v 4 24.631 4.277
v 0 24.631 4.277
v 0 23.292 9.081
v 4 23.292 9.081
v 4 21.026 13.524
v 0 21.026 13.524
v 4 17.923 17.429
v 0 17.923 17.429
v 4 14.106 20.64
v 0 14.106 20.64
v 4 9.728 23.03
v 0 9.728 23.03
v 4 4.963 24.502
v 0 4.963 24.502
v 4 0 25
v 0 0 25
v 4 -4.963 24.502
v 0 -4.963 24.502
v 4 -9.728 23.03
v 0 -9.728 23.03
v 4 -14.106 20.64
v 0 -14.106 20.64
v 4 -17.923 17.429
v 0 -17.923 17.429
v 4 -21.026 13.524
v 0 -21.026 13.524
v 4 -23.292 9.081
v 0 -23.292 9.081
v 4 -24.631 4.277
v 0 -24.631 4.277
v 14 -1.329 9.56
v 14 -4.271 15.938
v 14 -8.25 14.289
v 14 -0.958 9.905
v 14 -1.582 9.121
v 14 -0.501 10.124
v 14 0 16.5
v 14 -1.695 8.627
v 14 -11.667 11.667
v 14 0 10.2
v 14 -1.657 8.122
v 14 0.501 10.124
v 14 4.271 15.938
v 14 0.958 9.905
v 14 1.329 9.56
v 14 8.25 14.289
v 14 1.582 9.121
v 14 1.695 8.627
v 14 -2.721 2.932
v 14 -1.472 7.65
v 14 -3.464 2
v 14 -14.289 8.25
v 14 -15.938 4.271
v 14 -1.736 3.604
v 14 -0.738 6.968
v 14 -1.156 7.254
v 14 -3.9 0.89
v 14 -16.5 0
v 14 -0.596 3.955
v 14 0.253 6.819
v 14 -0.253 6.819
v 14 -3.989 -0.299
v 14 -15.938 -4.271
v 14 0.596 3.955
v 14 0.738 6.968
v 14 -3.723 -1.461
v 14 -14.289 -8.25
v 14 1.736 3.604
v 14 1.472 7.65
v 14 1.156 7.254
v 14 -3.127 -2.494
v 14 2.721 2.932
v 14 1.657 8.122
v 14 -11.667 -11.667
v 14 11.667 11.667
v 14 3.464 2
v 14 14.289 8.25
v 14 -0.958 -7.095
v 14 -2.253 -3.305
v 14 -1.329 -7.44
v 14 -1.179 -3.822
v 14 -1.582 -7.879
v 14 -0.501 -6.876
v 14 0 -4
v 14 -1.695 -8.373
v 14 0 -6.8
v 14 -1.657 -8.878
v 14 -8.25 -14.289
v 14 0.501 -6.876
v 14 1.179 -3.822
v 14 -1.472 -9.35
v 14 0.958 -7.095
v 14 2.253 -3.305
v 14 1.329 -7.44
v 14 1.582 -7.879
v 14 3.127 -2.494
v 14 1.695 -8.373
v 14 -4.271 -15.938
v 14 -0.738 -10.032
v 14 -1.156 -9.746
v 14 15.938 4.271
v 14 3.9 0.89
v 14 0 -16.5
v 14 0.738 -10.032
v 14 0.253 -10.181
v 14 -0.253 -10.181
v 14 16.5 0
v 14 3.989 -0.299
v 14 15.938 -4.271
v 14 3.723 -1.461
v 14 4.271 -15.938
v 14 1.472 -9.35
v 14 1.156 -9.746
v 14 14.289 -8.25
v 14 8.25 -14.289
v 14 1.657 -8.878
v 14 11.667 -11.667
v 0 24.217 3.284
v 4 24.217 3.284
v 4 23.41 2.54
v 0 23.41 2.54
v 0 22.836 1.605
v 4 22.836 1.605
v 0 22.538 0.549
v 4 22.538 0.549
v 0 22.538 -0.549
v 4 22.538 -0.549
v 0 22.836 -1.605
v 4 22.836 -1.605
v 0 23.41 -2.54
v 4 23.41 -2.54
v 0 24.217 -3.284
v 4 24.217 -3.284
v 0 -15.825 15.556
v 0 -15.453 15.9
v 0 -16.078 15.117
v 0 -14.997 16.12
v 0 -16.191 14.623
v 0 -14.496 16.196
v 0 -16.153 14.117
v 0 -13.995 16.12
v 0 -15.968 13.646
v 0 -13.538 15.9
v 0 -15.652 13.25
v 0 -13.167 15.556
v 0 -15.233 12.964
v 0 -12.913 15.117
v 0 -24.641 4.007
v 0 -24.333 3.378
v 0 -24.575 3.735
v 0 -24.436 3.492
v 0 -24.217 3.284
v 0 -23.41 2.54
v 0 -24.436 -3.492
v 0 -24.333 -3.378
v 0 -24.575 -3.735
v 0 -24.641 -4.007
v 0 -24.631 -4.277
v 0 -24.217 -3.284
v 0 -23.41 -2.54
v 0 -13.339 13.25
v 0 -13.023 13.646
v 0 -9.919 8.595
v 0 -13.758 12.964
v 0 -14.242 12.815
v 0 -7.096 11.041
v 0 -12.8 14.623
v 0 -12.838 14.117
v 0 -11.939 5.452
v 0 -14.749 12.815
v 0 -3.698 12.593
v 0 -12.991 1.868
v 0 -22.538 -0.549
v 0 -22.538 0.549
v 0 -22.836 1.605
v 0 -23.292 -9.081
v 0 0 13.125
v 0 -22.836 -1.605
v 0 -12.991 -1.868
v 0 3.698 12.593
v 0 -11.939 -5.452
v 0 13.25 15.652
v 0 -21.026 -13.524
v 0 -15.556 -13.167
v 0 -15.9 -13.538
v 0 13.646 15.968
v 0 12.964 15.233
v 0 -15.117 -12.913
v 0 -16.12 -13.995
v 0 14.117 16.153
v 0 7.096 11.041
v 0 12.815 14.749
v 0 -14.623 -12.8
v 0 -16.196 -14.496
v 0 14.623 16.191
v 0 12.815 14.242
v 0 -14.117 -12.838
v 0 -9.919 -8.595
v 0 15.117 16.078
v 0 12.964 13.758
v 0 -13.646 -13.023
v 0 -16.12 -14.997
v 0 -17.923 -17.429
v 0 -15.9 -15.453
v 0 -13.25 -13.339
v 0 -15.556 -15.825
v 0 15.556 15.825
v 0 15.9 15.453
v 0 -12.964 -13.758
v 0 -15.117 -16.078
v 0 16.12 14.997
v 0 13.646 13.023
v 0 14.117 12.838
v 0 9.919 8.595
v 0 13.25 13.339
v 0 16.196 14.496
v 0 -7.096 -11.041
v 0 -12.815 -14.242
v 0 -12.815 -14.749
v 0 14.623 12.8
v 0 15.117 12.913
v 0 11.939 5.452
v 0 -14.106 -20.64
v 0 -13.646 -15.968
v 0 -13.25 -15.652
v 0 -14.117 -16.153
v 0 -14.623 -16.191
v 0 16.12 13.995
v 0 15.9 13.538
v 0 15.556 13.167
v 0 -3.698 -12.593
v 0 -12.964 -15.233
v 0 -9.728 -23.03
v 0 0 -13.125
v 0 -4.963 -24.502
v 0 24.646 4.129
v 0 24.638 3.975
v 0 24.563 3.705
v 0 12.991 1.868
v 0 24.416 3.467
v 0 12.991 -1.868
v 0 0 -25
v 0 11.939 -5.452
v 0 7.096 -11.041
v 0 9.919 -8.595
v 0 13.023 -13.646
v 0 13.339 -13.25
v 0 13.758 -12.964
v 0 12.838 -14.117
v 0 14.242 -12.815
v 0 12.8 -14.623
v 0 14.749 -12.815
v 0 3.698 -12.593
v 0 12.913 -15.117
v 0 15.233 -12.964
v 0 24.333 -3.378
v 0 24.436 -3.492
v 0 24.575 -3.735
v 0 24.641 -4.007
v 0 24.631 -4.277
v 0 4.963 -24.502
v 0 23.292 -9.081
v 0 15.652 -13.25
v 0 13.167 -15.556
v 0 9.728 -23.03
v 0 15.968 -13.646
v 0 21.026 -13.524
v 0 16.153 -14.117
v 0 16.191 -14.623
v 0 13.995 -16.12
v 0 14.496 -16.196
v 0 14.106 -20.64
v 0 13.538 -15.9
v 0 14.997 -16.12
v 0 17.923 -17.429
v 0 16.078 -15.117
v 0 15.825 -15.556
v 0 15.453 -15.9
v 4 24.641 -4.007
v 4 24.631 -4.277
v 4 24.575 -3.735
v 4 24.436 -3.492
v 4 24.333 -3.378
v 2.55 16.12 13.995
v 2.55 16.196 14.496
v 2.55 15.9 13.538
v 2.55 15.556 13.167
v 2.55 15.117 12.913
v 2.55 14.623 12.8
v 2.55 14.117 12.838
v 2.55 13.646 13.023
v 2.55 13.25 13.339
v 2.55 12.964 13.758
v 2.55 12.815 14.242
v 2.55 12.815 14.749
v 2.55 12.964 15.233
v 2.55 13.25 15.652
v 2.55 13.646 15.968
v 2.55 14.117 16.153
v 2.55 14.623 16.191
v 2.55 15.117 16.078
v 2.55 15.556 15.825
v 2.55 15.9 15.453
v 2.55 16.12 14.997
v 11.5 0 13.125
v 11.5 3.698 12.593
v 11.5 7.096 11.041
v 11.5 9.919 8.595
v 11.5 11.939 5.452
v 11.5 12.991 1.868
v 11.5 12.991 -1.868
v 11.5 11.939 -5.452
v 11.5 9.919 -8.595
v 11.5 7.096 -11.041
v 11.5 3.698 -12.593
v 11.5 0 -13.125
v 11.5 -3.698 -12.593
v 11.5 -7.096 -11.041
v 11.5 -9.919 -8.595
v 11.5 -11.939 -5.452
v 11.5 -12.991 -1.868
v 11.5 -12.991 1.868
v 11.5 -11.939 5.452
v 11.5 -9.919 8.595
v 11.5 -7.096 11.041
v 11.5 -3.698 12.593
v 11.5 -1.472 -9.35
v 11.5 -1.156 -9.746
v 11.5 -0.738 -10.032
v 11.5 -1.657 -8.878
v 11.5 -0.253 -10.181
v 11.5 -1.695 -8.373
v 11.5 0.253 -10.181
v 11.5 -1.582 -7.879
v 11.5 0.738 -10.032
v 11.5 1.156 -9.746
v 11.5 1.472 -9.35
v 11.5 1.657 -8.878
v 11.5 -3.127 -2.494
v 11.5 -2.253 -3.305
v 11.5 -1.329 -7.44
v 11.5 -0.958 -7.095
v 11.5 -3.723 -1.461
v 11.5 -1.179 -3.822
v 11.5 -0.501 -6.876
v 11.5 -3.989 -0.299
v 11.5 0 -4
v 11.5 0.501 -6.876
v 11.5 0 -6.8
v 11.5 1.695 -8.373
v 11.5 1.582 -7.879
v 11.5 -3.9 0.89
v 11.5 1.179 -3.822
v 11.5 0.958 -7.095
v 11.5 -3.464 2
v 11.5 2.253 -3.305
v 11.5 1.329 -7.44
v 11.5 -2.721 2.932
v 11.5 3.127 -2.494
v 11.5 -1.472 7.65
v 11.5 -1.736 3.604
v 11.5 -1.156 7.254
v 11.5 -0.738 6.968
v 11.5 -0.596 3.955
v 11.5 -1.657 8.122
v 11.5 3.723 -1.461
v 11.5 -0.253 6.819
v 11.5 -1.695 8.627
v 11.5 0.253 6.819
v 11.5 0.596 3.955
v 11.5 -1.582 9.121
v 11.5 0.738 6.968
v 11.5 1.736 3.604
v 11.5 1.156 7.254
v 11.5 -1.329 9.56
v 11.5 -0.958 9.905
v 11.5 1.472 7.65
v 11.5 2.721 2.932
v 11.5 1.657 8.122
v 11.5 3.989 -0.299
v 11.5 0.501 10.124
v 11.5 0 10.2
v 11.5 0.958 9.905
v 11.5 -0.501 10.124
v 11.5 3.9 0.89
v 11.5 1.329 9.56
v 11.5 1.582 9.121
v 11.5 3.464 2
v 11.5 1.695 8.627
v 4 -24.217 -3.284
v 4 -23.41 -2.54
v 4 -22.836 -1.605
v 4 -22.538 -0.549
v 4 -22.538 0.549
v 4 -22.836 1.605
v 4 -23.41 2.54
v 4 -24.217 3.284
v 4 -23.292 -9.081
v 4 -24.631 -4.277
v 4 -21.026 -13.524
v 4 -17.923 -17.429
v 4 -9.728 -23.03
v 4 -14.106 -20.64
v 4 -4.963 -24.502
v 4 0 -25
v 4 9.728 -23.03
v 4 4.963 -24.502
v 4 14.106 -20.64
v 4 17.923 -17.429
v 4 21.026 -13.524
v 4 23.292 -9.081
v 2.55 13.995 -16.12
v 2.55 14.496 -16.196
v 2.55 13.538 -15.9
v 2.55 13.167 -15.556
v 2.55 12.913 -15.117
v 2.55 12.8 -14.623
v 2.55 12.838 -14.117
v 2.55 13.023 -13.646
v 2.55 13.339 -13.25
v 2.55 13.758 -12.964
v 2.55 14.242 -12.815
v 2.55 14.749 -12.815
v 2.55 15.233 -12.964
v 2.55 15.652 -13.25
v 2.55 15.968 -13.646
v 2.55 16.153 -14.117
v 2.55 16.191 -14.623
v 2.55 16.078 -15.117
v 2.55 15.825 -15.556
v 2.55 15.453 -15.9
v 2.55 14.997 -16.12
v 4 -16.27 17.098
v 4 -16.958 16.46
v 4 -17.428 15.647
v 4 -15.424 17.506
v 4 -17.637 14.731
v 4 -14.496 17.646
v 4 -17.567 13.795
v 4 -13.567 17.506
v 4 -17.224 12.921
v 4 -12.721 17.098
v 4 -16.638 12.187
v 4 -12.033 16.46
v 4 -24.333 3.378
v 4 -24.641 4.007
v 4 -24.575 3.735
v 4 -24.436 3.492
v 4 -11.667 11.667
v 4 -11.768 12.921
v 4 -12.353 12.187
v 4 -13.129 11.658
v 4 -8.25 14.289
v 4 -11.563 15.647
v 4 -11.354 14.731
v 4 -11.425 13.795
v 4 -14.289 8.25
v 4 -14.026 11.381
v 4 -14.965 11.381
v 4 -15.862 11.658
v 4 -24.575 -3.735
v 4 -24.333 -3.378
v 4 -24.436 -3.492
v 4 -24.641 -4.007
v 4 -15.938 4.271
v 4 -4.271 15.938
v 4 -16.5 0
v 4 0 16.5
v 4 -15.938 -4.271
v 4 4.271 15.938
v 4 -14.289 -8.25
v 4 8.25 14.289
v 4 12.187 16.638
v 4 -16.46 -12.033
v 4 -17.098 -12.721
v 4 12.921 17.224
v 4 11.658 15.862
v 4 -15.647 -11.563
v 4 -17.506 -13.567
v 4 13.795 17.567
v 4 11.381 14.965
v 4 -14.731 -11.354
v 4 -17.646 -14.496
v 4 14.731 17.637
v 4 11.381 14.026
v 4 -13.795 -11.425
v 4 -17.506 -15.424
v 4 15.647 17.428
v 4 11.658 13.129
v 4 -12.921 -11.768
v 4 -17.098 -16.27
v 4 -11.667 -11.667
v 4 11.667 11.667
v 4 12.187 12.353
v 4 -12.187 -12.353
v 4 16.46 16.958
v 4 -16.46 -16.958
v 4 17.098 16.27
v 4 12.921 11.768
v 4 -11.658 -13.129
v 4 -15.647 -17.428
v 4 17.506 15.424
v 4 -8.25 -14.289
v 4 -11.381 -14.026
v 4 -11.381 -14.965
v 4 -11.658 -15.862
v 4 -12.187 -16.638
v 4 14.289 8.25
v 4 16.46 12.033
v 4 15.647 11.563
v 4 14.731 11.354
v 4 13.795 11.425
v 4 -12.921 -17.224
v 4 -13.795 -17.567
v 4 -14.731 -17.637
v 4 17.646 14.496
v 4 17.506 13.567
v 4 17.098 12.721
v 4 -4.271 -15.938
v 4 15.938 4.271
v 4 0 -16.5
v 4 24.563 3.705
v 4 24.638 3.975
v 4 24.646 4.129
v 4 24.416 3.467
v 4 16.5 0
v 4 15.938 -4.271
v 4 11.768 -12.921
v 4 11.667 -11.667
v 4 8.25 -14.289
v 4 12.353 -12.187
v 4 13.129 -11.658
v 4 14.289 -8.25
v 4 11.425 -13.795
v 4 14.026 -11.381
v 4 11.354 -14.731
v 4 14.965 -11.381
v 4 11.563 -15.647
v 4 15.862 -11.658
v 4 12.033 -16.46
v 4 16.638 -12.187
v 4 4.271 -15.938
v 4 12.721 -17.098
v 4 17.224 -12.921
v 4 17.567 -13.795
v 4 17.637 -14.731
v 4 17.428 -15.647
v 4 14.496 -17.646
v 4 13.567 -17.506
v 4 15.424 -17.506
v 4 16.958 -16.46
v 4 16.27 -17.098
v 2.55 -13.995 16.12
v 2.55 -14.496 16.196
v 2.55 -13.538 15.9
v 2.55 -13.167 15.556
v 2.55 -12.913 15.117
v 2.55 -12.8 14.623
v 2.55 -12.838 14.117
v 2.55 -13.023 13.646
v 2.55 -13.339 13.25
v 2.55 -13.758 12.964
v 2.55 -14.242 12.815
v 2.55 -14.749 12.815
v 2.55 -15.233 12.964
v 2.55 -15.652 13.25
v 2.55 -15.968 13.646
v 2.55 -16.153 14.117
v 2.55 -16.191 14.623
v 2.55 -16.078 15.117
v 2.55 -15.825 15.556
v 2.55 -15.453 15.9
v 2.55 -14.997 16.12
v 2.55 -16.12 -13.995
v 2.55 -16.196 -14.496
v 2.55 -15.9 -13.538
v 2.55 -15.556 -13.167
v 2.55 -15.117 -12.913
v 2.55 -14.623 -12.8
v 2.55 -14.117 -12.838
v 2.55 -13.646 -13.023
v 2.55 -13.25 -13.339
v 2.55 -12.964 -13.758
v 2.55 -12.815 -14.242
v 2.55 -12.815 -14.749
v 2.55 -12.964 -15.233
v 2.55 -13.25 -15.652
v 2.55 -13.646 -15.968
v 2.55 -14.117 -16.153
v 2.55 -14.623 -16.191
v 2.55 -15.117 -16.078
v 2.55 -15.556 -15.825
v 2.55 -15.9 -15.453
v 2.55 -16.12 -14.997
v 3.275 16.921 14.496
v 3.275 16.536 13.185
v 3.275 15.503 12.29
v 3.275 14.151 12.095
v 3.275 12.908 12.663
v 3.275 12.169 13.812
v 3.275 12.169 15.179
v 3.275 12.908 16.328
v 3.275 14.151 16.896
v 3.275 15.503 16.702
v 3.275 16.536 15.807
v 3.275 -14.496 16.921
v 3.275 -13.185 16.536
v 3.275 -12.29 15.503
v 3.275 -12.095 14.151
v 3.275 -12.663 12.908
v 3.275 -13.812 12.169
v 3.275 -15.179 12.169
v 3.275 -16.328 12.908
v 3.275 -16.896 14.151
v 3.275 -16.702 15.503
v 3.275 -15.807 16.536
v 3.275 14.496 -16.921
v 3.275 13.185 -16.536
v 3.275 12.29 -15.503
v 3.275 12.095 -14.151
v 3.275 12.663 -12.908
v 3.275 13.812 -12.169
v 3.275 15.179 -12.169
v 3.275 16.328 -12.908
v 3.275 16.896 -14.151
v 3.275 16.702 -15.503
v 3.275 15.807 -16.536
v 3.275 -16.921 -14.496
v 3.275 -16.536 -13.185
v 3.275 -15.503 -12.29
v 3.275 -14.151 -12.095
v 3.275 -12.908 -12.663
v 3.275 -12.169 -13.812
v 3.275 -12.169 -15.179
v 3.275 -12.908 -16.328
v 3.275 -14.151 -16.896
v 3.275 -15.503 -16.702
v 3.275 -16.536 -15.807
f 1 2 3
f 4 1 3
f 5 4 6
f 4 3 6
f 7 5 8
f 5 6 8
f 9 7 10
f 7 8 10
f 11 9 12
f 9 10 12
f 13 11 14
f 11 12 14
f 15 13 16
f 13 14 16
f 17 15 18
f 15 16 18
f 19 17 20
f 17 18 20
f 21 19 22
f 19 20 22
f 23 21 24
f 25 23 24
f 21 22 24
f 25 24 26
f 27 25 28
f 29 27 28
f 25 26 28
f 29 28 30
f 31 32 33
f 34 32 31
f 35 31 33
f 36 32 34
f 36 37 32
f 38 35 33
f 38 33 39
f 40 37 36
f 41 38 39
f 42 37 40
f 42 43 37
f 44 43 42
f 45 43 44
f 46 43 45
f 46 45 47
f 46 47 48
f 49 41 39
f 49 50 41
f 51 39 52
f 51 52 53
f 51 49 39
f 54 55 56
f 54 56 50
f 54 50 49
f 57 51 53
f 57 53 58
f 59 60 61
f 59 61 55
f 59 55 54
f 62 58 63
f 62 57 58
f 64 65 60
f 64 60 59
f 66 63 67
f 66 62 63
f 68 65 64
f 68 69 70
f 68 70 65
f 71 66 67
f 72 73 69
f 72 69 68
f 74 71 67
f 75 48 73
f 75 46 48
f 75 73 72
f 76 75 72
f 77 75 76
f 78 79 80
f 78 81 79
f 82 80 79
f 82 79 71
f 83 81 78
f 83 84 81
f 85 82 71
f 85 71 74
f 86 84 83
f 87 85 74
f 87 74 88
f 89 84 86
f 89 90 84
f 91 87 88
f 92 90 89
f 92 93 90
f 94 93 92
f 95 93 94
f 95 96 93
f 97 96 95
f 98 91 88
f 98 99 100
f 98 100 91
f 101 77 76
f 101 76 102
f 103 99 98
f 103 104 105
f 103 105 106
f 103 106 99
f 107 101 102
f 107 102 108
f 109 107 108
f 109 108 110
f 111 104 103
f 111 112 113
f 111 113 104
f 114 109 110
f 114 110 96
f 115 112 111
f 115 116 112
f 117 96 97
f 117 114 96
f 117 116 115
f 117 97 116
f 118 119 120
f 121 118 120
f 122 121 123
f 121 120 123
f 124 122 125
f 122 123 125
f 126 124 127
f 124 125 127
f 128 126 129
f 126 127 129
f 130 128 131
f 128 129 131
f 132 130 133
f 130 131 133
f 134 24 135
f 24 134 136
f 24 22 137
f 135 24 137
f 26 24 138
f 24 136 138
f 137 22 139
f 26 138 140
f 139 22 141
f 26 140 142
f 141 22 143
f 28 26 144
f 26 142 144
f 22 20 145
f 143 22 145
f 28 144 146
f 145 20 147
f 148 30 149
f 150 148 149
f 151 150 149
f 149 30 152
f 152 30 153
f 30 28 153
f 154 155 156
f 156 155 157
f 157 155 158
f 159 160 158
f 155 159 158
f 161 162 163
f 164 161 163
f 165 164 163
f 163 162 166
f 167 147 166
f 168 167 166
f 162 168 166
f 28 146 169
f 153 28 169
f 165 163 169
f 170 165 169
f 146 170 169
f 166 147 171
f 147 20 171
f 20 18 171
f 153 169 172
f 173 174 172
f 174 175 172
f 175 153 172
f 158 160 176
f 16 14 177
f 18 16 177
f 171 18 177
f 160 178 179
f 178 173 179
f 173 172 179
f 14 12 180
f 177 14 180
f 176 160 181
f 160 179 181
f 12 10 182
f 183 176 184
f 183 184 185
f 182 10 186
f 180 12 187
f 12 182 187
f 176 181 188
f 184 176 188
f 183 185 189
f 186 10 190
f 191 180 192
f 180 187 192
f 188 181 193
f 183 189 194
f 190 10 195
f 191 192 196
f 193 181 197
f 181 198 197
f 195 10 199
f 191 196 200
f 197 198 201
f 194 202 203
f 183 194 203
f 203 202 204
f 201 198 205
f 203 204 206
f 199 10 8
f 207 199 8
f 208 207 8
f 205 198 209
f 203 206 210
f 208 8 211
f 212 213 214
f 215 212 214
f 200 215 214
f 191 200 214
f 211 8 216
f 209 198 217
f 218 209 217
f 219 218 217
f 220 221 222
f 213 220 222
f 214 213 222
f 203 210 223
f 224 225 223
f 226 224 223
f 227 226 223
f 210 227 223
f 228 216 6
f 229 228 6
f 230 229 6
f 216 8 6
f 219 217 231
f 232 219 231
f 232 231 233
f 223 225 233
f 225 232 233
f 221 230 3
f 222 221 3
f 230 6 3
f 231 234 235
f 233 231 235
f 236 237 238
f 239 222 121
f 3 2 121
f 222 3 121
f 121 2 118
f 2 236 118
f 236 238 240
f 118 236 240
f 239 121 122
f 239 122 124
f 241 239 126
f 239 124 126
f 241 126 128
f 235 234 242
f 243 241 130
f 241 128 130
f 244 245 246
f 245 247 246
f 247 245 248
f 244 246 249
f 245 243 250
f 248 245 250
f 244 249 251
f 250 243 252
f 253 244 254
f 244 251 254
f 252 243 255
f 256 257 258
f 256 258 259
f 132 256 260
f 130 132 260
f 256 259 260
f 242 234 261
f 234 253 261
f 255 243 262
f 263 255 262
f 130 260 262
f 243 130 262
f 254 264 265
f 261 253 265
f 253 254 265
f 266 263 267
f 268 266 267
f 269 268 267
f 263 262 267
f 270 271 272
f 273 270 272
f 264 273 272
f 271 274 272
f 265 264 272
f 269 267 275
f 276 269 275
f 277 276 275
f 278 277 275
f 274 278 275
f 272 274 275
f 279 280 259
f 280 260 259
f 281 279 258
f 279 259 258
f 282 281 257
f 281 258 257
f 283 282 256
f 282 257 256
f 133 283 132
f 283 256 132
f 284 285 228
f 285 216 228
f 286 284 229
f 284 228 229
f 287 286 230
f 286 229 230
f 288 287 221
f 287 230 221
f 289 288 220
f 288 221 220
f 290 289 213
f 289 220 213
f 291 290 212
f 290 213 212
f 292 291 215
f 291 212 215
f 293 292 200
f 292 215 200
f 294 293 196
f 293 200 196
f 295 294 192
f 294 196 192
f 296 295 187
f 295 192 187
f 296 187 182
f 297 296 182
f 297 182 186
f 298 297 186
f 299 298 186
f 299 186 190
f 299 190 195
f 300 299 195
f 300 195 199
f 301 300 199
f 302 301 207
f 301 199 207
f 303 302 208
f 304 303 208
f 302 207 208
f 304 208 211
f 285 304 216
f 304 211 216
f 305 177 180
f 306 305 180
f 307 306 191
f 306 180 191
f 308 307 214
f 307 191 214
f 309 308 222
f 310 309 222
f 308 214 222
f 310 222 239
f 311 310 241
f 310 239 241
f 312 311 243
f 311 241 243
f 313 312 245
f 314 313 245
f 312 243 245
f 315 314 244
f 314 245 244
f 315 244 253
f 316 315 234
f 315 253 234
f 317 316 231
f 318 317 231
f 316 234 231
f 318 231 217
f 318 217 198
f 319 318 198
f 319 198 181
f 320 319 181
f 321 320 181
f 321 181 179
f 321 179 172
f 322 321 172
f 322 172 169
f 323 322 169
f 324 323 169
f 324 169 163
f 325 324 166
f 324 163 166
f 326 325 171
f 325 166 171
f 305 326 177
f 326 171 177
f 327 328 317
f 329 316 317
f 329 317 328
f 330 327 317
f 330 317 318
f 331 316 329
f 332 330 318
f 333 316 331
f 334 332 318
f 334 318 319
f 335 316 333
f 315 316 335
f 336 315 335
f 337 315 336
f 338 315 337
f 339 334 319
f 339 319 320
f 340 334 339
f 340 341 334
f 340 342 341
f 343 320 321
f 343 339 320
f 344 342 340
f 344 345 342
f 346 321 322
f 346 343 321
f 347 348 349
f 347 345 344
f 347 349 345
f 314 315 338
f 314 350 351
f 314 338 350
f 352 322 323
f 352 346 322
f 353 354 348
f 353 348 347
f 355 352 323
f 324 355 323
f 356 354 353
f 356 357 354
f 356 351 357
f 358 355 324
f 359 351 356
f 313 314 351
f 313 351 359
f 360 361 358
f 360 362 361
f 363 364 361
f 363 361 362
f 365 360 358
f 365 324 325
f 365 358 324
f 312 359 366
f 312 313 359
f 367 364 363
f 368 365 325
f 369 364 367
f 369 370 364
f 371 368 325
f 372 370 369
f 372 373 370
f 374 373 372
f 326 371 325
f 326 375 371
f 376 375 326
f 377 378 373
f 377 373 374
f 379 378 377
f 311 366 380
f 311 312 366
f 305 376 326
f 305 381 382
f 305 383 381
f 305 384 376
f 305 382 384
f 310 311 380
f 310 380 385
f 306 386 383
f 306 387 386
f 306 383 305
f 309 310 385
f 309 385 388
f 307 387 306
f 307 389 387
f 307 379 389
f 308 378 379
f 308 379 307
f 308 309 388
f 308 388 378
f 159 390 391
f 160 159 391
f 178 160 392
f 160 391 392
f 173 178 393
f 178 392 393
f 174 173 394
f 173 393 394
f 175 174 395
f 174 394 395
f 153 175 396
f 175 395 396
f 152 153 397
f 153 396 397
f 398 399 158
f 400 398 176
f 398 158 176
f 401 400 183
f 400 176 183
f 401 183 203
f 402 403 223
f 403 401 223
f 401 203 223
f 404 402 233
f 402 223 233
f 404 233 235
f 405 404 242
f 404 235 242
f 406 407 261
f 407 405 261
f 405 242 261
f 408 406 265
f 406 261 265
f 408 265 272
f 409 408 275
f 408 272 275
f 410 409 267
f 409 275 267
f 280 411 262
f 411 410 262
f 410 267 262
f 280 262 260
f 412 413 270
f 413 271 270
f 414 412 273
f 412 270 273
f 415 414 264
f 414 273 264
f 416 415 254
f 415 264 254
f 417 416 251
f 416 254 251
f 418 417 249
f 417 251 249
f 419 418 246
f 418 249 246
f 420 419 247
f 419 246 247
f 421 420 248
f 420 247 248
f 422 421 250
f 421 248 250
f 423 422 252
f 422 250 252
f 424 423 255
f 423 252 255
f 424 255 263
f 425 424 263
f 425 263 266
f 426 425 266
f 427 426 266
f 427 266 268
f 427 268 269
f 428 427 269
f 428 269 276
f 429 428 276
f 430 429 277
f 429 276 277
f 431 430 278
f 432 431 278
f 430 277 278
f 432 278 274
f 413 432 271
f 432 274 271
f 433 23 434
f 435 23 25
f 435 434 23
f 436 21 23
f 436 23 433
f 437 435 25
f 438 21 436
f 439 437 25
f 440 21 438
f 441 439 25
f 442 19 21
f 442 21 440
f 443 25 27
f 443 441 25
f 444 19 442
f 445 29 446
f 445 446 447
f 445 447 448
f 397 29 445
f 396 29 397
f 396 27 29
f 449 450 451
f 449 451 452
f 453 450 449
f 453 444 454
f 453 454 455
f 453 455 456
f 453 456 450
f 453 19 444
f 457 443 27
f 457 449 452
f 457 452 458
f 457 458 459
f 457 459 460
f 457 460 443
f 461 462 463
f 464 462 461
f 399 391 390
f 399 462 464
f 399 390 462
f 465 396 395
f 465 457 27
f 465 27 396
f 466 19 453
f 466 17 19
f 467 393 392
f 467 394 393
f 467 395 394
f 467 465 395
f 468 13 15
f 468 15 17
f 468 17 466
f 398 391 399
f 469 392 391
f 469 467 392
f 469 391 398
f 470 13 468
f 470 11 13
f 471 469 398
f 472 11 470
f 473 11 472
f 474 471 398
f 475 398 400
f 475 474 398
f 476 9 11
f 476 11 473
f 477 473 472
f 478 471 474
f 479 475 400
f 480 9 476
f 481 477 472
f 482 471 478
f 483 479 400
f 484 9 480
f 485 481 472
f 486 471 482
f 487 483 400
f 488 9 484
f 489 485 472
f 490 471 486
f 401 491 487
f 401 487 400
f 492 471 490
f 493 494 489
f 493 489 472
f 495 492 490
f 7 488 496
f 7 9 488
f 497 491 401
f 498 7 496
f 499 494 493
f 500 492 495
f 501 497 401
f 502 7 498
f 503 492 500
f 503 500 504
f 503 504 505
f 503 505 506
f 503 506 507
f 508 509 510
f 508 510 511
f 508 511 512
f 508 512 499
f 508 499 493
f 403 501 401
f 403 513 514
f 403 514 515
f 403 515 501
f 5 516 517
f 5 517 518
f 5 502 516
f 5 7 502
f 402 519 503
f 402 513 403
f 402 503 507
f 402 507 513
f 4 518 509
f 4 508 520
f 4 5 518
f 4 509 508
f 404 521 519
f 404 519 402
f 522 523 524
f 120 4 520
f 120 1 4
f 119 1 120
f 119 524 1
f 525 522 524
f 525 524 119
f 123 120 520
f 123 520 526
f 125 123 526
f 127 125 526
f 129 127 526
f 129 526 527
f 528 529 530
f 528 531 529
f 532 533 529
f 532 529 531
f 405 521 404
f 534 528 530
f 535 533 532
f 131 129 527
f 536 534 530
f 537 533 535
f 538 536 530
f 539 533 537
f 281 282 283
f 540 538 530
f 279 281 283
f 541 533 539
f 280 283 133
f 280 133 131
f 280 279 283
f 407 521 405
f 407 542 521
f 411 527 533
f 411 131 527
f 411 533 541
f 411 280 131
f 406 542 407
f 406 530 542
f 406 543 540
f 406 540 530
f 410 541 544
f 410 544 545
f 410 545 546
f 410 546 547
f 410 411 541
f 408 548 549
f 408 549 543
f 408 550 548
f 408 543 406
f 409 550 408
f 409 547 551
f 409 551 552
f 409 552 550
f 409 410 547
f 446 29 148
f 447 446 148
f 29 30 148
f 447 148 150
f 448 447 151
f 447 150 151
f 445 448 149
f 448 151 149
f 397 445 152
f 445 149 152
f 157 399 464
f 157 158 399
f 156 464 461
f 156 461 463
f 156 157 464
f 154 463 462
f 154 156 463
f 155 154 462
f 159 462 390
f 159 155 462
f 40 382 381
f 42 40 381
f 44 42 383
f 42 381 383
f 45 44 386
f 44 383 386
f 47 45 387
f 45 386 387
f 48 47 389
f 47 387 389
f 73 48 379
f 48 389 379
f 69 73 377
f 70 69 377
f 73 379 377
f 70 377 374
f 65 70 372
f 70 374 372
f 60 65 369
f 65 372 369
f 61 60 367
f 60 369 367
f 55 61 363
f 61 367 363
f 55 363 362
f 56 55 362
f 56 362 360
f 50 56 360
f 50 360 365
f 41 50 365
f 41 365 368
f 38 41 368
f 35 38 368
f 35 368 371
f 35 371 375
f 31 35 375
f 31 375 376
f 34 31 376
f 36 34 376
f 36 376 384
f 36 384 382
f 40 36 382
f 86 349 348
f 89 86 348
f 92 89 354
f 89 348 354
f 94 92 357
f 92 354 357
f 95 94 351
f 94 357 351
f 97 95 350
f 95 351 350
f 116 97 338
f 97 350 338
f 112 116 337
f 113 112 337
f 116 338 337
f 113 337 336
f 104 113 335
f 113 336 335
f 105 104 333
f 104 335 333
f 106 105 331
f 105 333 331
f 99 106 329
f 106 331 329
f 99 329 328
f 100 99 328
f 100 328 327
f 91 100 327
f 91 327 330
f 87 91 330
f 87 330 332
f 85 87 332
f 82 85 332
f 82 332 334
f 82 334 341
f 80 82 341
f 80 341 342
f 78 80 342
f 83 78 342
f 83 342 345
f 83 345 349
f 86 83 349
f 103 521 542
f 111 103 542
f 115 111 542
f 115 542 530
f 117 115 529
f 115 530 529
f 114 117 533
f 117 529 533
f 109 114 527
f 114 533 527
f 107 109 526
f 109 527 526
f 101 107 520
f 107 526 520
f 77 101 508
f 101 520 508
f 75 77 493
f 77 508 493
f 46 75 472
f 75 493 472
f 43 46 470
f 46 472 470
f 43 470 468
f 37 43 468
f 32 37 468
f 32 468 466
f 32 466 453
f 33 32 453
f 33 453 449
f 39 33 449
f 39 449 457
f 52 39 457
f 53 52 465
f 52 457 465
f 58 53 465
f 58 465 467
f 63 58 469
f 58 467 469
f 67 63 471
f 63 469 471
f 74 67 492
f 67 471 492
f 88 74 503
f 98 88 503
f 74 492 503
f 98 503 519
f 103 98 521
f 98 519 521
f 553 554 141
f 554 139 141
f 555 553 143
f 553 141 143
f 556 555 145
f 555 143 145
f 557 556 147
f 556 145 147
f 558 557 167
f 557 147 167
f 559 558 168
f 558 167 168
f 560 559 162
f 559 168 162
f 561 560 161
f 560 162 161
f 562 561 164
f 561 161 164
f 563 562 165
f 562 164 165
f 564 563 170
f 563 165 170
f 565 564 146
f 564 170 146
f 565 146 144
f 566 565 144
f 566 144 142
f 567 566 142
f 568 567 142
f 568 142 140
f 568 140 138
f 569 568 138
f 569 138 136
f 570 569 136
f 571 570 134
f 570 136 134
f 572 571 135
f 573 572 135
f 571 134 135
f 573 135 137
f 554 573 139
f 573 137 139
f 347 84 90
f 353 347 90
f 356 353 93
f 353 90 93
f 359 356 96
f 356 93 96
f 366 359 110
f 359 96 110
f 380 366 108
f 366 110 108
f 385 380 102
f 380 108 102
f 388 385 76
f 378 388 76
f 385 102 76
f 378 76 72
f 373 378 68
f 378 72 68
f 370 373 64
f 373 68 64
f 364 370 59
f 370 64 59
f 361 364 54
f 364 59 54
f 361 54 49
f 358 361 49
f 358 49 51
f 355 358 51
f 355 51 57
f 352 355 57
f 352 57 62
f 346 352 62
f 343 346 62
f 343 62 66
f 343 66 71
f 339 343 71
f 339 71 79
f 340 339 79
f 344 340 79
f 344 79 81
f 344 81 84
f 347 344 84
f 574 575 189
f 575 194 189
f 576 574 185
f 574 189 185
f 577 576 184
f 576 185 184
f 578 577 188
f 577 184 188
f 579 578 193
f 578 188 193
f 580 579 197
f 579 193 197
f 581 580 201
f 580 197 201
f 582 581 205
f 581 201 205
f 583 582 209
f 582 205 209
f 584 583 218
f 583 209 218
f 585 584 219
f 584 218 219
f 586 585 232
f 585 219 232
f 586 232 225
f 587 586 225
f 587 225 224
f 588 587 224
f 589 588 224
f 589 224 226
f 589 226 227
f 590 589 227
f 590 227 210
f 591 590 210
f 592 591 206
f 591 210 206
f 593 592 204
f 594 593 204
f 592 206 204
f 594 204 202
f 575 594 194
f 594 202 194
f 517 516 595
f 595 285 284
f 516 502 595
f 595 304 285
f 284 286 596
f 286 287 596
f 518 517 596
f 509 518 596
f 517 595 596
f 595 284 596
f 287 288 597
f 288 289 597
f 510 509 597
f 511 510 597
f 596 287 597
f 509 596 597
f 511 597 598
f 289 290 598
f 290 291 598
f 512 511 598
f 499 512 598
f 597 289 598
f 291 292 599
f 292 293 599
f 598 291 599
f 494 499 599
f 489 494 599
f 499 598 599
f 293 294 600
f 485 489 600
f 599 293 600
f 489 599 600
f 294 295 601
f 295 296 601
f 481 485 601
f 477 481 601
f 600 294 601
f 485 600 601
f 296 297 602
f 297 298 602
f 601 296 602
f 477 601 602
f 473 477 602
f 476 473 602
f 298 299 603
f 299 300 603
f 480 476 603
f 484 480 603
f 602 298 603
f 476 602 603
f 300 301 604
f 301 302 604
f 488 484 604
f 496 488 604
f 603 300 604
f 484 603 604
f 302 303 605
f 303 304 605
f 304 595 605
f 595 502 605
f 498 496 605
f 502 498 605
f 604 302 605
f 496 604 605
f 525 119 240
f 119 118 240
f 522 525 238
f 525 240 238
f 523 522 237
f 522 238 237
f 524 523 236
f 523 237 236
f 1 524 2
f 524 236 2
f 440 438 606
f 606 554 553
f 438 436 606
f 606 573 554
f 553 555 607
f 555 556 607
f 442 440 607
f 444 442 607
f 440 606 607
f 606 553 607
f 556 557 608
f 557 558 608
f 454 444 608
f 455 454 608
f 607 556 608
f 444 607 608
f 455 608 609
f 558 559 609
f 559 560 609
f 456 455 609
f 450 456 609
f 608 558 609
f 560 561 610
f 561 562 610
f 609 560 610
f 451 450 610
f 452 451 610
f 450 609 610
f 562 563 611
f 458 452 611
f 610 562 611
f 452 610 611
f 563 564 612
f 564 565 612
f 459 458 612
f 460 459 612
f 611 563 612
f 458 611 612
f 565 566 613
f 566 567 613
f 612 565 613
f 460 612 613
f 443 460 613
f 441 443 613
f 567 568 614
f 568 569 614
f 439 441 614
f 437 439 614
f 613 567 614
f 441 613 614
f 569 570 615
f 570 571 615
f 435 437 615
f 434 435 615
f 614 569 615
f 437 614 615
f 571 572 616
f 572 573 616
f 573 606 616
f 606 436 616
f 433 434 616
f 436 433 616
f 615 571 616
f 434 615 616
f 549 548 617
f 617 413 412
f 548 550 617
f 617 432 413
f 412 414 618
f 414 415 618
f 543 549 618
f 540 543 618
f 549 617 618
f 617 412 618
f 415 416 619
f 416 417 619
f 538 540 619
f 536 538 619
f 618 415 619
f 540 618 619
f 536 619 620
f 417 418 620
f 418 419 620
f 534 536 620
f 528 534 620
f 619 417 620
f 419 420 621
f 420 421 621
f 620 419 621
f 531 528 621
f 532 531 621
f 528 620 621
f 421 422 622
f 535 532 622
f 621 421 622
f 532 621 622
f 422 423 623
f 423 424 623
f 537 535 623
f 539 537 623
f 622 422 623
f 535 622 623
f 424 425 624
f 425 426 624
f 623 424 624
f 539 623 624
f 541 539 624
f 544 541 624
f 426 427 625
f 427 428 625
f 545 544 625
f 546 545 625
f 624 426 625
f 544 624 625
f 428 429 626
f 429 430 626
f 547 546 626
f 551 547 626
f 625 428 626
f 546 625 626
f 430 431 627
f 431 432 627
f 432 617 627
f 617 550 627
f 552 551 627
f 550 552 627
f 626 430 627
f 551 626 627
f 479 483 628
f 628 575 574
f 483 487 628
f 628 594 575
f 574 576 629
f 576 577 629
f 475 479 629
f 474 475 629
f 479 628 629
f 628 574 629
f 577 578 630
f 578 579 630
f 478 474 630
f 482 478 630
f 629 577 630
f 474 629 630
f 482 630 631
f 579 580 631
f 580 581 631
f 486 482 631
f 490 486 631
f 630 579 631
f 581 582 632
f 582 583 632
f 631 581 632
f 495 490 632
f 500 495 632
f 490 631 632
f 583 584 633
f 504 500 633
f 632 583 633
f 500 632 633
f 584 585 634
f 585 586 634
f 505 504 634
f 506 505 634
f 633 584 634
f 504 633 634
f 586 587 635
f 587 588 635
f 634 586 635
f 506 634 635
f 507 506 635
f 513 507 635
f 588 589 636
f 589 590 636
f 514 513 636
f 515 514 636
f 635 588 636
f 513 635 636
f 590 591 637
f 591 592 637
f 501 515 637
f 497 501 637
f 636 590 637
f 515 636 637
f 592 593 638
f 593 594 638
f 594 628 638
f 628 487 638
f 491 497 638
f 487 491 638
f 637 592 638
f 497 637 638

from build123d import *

# Parameters (mm, degrees)
SKETCH1_R                                       = 25
BOSS_EXTRUDE1_DEPTH                             = 4
SKETCH2_R                                       = 16.5
BOSS_EXTRUDE2_DEPTH                             = 10
SKETCH3_R                                       = 12.5
CUT_EXTRUDE1_DEPTH                              = 11.5
SKETCH4_R                                       = 4
CUT_EXTRUDE2_DEPTH                              = 4
M3_CLEARANCE_HOLE1_D                            = 3.4
M3_CLEARANCE_HOLE1_DEPTH                        = 10
CSK_FOR_M3_FLAT_HEAD_MACHINE_SCREW1_D           = 3.4
CSK_FOR_M3_FLAT_HEAD_MACHINE_SCREW1_CSINK_D     = 6.3
CSK_FOR_M3_FLAT_HEAD_MACHINE_SCREW1_CSINK_ANGLE = 90
CIRPATTERN1_COUNT                               = 4
SKETCH10_R                                      = 13.125
CUT_EXTRUDE3_DEPTH                              = 11.5
SKETCH12_R                                      = 4
CUT_EXTRUDE4_DEPTH                              = 10
FILLET1_R                                       = 1


with BuildPart() as part:
    # Sketch1 → Boss-Extrude1 (new body)
    with BuildSketch(Plane(origin=(0, 0, 0), x_dir=(0, 0, -1), z_dir=(1, 0, 0))):
        Circle(SKETCH1_R)
    extrude(amount=BOSS_EXTRUDE1_DEPTH)

    # Sketch2 → Boss-Extrude2 (add)
    with BuildSketch(Plane(origin=(4, 0, 0), x_dir=(0, 0, -1), z_dir=(1, 0, 0))):
        Circle(SKETCH2_R)
    extrude(amount=BOSS_EXTRUDE2_DEPTH)

    # Sketch3 → Cut-Extrude1 (cut)
    with BuildSketch(Plane.ZY):
        Circle(SKETCH3_R)
    extrude(amount=-CUT_EXTRUDE1_DEPTH, mode=Mode.SUBTRACT)

    # Sketch4 → Cut-Extrude2 (cut)
    with BuildSketch(Plane(origin=(14, 0, 0), x_dir=(0, 0, -1), z_dir=(1, 0, 0))):
        Circle(SKETCH4_R)
    extrude(amount=-CUT_EXTRUDE2_DEPTH, mode=Mode.SUBTRACT)

    # M3 Clearance Hole1
    with Locations(Plane(origin=(14, 0, 0), x_dir=(0, 0, -1), z_dir=(1, 0, 0))):
        with Locations((8.5, 0), (-8.5, 0)):
            Hole(M3_CLEARANCE_HOLE1_D / 2, depth=M3_CLEARANCE_HOLE1_DEPTH)

    # CSK for M3 Flat Head Machine Screw1 (through all)
    with Locations(Plane(origin=(4, 0, 0), x_dir=(0, 0, -1), z_dir=(1, 0, 0))):
        with Locations((-14.495689014, -14.495689014)):
            csk_for_m3_flat_head_machine_screw1 = CounterSinkHole(CSK_FOR_M3_FLAT_HEAD_MACHINE_SCREW1_D / 2, CSK_FOR_M3_FLAT_HEAD_MACHINE_SCREW1_CSINK_D / 2, counter_sink_angle=CSK_FOR_M3_FLAT_HEAD_MACHINE_SCREW1_CSINK_ANGLE)

    # CirPattern1: CSK for M3 Flat Head Machine Screw1 ×4 about axis
    cirpattern1_axis = Axis((0, 0, 0), (1, 0, 0))
    for i in range(1, CIRPATTERN1_COUNT):
        add(csk_for_m3_flat_head_machine_screw1.rotate(cirpattern1_axis, i * 360 / CIRPATTERN1_COUNT), mode=Mode.SUBTRACT)

    # Sketch10 → Cut-Extrude3 (cut)
    with BuildSketch(Plane.ZY):
        Circle(SKETCH10_R)
    extrude(amount=-CUT_EXTRUDE3_DEPTH, mode=Mode.SUBTRACT)

    # Sketch12 → Cut-Extrude4 (cut)
    with BuildSketch(Plane(origin=(4, 0, 0), x_dir=(0, 0, -1), z_dir=(1, 0, 0))):
        with Locations((0, 26.5)):
            Circle(SKETCH12_R)
        with Locations((0, -26.5)):
            Circle(SKETCH12_R)
    extrude(amount=-CUT_EXTRUDE4_DEPTH, mode=Mode.SUBTRACT)

    # Fillet1
    fillet1_edges = [part.edges().sort_by_distance(p)[0] for p in [
        (2, 24.740566038, -3.592268383),
        (2, 24.740566038, 3.592268383),
        (2, -24.740566038, 3.592268383),
        (2, -24.740566038, -3.592268383),
    ]]
    fillet(fillet1_edges, radius=FILLET1_R)


solid = part.part
